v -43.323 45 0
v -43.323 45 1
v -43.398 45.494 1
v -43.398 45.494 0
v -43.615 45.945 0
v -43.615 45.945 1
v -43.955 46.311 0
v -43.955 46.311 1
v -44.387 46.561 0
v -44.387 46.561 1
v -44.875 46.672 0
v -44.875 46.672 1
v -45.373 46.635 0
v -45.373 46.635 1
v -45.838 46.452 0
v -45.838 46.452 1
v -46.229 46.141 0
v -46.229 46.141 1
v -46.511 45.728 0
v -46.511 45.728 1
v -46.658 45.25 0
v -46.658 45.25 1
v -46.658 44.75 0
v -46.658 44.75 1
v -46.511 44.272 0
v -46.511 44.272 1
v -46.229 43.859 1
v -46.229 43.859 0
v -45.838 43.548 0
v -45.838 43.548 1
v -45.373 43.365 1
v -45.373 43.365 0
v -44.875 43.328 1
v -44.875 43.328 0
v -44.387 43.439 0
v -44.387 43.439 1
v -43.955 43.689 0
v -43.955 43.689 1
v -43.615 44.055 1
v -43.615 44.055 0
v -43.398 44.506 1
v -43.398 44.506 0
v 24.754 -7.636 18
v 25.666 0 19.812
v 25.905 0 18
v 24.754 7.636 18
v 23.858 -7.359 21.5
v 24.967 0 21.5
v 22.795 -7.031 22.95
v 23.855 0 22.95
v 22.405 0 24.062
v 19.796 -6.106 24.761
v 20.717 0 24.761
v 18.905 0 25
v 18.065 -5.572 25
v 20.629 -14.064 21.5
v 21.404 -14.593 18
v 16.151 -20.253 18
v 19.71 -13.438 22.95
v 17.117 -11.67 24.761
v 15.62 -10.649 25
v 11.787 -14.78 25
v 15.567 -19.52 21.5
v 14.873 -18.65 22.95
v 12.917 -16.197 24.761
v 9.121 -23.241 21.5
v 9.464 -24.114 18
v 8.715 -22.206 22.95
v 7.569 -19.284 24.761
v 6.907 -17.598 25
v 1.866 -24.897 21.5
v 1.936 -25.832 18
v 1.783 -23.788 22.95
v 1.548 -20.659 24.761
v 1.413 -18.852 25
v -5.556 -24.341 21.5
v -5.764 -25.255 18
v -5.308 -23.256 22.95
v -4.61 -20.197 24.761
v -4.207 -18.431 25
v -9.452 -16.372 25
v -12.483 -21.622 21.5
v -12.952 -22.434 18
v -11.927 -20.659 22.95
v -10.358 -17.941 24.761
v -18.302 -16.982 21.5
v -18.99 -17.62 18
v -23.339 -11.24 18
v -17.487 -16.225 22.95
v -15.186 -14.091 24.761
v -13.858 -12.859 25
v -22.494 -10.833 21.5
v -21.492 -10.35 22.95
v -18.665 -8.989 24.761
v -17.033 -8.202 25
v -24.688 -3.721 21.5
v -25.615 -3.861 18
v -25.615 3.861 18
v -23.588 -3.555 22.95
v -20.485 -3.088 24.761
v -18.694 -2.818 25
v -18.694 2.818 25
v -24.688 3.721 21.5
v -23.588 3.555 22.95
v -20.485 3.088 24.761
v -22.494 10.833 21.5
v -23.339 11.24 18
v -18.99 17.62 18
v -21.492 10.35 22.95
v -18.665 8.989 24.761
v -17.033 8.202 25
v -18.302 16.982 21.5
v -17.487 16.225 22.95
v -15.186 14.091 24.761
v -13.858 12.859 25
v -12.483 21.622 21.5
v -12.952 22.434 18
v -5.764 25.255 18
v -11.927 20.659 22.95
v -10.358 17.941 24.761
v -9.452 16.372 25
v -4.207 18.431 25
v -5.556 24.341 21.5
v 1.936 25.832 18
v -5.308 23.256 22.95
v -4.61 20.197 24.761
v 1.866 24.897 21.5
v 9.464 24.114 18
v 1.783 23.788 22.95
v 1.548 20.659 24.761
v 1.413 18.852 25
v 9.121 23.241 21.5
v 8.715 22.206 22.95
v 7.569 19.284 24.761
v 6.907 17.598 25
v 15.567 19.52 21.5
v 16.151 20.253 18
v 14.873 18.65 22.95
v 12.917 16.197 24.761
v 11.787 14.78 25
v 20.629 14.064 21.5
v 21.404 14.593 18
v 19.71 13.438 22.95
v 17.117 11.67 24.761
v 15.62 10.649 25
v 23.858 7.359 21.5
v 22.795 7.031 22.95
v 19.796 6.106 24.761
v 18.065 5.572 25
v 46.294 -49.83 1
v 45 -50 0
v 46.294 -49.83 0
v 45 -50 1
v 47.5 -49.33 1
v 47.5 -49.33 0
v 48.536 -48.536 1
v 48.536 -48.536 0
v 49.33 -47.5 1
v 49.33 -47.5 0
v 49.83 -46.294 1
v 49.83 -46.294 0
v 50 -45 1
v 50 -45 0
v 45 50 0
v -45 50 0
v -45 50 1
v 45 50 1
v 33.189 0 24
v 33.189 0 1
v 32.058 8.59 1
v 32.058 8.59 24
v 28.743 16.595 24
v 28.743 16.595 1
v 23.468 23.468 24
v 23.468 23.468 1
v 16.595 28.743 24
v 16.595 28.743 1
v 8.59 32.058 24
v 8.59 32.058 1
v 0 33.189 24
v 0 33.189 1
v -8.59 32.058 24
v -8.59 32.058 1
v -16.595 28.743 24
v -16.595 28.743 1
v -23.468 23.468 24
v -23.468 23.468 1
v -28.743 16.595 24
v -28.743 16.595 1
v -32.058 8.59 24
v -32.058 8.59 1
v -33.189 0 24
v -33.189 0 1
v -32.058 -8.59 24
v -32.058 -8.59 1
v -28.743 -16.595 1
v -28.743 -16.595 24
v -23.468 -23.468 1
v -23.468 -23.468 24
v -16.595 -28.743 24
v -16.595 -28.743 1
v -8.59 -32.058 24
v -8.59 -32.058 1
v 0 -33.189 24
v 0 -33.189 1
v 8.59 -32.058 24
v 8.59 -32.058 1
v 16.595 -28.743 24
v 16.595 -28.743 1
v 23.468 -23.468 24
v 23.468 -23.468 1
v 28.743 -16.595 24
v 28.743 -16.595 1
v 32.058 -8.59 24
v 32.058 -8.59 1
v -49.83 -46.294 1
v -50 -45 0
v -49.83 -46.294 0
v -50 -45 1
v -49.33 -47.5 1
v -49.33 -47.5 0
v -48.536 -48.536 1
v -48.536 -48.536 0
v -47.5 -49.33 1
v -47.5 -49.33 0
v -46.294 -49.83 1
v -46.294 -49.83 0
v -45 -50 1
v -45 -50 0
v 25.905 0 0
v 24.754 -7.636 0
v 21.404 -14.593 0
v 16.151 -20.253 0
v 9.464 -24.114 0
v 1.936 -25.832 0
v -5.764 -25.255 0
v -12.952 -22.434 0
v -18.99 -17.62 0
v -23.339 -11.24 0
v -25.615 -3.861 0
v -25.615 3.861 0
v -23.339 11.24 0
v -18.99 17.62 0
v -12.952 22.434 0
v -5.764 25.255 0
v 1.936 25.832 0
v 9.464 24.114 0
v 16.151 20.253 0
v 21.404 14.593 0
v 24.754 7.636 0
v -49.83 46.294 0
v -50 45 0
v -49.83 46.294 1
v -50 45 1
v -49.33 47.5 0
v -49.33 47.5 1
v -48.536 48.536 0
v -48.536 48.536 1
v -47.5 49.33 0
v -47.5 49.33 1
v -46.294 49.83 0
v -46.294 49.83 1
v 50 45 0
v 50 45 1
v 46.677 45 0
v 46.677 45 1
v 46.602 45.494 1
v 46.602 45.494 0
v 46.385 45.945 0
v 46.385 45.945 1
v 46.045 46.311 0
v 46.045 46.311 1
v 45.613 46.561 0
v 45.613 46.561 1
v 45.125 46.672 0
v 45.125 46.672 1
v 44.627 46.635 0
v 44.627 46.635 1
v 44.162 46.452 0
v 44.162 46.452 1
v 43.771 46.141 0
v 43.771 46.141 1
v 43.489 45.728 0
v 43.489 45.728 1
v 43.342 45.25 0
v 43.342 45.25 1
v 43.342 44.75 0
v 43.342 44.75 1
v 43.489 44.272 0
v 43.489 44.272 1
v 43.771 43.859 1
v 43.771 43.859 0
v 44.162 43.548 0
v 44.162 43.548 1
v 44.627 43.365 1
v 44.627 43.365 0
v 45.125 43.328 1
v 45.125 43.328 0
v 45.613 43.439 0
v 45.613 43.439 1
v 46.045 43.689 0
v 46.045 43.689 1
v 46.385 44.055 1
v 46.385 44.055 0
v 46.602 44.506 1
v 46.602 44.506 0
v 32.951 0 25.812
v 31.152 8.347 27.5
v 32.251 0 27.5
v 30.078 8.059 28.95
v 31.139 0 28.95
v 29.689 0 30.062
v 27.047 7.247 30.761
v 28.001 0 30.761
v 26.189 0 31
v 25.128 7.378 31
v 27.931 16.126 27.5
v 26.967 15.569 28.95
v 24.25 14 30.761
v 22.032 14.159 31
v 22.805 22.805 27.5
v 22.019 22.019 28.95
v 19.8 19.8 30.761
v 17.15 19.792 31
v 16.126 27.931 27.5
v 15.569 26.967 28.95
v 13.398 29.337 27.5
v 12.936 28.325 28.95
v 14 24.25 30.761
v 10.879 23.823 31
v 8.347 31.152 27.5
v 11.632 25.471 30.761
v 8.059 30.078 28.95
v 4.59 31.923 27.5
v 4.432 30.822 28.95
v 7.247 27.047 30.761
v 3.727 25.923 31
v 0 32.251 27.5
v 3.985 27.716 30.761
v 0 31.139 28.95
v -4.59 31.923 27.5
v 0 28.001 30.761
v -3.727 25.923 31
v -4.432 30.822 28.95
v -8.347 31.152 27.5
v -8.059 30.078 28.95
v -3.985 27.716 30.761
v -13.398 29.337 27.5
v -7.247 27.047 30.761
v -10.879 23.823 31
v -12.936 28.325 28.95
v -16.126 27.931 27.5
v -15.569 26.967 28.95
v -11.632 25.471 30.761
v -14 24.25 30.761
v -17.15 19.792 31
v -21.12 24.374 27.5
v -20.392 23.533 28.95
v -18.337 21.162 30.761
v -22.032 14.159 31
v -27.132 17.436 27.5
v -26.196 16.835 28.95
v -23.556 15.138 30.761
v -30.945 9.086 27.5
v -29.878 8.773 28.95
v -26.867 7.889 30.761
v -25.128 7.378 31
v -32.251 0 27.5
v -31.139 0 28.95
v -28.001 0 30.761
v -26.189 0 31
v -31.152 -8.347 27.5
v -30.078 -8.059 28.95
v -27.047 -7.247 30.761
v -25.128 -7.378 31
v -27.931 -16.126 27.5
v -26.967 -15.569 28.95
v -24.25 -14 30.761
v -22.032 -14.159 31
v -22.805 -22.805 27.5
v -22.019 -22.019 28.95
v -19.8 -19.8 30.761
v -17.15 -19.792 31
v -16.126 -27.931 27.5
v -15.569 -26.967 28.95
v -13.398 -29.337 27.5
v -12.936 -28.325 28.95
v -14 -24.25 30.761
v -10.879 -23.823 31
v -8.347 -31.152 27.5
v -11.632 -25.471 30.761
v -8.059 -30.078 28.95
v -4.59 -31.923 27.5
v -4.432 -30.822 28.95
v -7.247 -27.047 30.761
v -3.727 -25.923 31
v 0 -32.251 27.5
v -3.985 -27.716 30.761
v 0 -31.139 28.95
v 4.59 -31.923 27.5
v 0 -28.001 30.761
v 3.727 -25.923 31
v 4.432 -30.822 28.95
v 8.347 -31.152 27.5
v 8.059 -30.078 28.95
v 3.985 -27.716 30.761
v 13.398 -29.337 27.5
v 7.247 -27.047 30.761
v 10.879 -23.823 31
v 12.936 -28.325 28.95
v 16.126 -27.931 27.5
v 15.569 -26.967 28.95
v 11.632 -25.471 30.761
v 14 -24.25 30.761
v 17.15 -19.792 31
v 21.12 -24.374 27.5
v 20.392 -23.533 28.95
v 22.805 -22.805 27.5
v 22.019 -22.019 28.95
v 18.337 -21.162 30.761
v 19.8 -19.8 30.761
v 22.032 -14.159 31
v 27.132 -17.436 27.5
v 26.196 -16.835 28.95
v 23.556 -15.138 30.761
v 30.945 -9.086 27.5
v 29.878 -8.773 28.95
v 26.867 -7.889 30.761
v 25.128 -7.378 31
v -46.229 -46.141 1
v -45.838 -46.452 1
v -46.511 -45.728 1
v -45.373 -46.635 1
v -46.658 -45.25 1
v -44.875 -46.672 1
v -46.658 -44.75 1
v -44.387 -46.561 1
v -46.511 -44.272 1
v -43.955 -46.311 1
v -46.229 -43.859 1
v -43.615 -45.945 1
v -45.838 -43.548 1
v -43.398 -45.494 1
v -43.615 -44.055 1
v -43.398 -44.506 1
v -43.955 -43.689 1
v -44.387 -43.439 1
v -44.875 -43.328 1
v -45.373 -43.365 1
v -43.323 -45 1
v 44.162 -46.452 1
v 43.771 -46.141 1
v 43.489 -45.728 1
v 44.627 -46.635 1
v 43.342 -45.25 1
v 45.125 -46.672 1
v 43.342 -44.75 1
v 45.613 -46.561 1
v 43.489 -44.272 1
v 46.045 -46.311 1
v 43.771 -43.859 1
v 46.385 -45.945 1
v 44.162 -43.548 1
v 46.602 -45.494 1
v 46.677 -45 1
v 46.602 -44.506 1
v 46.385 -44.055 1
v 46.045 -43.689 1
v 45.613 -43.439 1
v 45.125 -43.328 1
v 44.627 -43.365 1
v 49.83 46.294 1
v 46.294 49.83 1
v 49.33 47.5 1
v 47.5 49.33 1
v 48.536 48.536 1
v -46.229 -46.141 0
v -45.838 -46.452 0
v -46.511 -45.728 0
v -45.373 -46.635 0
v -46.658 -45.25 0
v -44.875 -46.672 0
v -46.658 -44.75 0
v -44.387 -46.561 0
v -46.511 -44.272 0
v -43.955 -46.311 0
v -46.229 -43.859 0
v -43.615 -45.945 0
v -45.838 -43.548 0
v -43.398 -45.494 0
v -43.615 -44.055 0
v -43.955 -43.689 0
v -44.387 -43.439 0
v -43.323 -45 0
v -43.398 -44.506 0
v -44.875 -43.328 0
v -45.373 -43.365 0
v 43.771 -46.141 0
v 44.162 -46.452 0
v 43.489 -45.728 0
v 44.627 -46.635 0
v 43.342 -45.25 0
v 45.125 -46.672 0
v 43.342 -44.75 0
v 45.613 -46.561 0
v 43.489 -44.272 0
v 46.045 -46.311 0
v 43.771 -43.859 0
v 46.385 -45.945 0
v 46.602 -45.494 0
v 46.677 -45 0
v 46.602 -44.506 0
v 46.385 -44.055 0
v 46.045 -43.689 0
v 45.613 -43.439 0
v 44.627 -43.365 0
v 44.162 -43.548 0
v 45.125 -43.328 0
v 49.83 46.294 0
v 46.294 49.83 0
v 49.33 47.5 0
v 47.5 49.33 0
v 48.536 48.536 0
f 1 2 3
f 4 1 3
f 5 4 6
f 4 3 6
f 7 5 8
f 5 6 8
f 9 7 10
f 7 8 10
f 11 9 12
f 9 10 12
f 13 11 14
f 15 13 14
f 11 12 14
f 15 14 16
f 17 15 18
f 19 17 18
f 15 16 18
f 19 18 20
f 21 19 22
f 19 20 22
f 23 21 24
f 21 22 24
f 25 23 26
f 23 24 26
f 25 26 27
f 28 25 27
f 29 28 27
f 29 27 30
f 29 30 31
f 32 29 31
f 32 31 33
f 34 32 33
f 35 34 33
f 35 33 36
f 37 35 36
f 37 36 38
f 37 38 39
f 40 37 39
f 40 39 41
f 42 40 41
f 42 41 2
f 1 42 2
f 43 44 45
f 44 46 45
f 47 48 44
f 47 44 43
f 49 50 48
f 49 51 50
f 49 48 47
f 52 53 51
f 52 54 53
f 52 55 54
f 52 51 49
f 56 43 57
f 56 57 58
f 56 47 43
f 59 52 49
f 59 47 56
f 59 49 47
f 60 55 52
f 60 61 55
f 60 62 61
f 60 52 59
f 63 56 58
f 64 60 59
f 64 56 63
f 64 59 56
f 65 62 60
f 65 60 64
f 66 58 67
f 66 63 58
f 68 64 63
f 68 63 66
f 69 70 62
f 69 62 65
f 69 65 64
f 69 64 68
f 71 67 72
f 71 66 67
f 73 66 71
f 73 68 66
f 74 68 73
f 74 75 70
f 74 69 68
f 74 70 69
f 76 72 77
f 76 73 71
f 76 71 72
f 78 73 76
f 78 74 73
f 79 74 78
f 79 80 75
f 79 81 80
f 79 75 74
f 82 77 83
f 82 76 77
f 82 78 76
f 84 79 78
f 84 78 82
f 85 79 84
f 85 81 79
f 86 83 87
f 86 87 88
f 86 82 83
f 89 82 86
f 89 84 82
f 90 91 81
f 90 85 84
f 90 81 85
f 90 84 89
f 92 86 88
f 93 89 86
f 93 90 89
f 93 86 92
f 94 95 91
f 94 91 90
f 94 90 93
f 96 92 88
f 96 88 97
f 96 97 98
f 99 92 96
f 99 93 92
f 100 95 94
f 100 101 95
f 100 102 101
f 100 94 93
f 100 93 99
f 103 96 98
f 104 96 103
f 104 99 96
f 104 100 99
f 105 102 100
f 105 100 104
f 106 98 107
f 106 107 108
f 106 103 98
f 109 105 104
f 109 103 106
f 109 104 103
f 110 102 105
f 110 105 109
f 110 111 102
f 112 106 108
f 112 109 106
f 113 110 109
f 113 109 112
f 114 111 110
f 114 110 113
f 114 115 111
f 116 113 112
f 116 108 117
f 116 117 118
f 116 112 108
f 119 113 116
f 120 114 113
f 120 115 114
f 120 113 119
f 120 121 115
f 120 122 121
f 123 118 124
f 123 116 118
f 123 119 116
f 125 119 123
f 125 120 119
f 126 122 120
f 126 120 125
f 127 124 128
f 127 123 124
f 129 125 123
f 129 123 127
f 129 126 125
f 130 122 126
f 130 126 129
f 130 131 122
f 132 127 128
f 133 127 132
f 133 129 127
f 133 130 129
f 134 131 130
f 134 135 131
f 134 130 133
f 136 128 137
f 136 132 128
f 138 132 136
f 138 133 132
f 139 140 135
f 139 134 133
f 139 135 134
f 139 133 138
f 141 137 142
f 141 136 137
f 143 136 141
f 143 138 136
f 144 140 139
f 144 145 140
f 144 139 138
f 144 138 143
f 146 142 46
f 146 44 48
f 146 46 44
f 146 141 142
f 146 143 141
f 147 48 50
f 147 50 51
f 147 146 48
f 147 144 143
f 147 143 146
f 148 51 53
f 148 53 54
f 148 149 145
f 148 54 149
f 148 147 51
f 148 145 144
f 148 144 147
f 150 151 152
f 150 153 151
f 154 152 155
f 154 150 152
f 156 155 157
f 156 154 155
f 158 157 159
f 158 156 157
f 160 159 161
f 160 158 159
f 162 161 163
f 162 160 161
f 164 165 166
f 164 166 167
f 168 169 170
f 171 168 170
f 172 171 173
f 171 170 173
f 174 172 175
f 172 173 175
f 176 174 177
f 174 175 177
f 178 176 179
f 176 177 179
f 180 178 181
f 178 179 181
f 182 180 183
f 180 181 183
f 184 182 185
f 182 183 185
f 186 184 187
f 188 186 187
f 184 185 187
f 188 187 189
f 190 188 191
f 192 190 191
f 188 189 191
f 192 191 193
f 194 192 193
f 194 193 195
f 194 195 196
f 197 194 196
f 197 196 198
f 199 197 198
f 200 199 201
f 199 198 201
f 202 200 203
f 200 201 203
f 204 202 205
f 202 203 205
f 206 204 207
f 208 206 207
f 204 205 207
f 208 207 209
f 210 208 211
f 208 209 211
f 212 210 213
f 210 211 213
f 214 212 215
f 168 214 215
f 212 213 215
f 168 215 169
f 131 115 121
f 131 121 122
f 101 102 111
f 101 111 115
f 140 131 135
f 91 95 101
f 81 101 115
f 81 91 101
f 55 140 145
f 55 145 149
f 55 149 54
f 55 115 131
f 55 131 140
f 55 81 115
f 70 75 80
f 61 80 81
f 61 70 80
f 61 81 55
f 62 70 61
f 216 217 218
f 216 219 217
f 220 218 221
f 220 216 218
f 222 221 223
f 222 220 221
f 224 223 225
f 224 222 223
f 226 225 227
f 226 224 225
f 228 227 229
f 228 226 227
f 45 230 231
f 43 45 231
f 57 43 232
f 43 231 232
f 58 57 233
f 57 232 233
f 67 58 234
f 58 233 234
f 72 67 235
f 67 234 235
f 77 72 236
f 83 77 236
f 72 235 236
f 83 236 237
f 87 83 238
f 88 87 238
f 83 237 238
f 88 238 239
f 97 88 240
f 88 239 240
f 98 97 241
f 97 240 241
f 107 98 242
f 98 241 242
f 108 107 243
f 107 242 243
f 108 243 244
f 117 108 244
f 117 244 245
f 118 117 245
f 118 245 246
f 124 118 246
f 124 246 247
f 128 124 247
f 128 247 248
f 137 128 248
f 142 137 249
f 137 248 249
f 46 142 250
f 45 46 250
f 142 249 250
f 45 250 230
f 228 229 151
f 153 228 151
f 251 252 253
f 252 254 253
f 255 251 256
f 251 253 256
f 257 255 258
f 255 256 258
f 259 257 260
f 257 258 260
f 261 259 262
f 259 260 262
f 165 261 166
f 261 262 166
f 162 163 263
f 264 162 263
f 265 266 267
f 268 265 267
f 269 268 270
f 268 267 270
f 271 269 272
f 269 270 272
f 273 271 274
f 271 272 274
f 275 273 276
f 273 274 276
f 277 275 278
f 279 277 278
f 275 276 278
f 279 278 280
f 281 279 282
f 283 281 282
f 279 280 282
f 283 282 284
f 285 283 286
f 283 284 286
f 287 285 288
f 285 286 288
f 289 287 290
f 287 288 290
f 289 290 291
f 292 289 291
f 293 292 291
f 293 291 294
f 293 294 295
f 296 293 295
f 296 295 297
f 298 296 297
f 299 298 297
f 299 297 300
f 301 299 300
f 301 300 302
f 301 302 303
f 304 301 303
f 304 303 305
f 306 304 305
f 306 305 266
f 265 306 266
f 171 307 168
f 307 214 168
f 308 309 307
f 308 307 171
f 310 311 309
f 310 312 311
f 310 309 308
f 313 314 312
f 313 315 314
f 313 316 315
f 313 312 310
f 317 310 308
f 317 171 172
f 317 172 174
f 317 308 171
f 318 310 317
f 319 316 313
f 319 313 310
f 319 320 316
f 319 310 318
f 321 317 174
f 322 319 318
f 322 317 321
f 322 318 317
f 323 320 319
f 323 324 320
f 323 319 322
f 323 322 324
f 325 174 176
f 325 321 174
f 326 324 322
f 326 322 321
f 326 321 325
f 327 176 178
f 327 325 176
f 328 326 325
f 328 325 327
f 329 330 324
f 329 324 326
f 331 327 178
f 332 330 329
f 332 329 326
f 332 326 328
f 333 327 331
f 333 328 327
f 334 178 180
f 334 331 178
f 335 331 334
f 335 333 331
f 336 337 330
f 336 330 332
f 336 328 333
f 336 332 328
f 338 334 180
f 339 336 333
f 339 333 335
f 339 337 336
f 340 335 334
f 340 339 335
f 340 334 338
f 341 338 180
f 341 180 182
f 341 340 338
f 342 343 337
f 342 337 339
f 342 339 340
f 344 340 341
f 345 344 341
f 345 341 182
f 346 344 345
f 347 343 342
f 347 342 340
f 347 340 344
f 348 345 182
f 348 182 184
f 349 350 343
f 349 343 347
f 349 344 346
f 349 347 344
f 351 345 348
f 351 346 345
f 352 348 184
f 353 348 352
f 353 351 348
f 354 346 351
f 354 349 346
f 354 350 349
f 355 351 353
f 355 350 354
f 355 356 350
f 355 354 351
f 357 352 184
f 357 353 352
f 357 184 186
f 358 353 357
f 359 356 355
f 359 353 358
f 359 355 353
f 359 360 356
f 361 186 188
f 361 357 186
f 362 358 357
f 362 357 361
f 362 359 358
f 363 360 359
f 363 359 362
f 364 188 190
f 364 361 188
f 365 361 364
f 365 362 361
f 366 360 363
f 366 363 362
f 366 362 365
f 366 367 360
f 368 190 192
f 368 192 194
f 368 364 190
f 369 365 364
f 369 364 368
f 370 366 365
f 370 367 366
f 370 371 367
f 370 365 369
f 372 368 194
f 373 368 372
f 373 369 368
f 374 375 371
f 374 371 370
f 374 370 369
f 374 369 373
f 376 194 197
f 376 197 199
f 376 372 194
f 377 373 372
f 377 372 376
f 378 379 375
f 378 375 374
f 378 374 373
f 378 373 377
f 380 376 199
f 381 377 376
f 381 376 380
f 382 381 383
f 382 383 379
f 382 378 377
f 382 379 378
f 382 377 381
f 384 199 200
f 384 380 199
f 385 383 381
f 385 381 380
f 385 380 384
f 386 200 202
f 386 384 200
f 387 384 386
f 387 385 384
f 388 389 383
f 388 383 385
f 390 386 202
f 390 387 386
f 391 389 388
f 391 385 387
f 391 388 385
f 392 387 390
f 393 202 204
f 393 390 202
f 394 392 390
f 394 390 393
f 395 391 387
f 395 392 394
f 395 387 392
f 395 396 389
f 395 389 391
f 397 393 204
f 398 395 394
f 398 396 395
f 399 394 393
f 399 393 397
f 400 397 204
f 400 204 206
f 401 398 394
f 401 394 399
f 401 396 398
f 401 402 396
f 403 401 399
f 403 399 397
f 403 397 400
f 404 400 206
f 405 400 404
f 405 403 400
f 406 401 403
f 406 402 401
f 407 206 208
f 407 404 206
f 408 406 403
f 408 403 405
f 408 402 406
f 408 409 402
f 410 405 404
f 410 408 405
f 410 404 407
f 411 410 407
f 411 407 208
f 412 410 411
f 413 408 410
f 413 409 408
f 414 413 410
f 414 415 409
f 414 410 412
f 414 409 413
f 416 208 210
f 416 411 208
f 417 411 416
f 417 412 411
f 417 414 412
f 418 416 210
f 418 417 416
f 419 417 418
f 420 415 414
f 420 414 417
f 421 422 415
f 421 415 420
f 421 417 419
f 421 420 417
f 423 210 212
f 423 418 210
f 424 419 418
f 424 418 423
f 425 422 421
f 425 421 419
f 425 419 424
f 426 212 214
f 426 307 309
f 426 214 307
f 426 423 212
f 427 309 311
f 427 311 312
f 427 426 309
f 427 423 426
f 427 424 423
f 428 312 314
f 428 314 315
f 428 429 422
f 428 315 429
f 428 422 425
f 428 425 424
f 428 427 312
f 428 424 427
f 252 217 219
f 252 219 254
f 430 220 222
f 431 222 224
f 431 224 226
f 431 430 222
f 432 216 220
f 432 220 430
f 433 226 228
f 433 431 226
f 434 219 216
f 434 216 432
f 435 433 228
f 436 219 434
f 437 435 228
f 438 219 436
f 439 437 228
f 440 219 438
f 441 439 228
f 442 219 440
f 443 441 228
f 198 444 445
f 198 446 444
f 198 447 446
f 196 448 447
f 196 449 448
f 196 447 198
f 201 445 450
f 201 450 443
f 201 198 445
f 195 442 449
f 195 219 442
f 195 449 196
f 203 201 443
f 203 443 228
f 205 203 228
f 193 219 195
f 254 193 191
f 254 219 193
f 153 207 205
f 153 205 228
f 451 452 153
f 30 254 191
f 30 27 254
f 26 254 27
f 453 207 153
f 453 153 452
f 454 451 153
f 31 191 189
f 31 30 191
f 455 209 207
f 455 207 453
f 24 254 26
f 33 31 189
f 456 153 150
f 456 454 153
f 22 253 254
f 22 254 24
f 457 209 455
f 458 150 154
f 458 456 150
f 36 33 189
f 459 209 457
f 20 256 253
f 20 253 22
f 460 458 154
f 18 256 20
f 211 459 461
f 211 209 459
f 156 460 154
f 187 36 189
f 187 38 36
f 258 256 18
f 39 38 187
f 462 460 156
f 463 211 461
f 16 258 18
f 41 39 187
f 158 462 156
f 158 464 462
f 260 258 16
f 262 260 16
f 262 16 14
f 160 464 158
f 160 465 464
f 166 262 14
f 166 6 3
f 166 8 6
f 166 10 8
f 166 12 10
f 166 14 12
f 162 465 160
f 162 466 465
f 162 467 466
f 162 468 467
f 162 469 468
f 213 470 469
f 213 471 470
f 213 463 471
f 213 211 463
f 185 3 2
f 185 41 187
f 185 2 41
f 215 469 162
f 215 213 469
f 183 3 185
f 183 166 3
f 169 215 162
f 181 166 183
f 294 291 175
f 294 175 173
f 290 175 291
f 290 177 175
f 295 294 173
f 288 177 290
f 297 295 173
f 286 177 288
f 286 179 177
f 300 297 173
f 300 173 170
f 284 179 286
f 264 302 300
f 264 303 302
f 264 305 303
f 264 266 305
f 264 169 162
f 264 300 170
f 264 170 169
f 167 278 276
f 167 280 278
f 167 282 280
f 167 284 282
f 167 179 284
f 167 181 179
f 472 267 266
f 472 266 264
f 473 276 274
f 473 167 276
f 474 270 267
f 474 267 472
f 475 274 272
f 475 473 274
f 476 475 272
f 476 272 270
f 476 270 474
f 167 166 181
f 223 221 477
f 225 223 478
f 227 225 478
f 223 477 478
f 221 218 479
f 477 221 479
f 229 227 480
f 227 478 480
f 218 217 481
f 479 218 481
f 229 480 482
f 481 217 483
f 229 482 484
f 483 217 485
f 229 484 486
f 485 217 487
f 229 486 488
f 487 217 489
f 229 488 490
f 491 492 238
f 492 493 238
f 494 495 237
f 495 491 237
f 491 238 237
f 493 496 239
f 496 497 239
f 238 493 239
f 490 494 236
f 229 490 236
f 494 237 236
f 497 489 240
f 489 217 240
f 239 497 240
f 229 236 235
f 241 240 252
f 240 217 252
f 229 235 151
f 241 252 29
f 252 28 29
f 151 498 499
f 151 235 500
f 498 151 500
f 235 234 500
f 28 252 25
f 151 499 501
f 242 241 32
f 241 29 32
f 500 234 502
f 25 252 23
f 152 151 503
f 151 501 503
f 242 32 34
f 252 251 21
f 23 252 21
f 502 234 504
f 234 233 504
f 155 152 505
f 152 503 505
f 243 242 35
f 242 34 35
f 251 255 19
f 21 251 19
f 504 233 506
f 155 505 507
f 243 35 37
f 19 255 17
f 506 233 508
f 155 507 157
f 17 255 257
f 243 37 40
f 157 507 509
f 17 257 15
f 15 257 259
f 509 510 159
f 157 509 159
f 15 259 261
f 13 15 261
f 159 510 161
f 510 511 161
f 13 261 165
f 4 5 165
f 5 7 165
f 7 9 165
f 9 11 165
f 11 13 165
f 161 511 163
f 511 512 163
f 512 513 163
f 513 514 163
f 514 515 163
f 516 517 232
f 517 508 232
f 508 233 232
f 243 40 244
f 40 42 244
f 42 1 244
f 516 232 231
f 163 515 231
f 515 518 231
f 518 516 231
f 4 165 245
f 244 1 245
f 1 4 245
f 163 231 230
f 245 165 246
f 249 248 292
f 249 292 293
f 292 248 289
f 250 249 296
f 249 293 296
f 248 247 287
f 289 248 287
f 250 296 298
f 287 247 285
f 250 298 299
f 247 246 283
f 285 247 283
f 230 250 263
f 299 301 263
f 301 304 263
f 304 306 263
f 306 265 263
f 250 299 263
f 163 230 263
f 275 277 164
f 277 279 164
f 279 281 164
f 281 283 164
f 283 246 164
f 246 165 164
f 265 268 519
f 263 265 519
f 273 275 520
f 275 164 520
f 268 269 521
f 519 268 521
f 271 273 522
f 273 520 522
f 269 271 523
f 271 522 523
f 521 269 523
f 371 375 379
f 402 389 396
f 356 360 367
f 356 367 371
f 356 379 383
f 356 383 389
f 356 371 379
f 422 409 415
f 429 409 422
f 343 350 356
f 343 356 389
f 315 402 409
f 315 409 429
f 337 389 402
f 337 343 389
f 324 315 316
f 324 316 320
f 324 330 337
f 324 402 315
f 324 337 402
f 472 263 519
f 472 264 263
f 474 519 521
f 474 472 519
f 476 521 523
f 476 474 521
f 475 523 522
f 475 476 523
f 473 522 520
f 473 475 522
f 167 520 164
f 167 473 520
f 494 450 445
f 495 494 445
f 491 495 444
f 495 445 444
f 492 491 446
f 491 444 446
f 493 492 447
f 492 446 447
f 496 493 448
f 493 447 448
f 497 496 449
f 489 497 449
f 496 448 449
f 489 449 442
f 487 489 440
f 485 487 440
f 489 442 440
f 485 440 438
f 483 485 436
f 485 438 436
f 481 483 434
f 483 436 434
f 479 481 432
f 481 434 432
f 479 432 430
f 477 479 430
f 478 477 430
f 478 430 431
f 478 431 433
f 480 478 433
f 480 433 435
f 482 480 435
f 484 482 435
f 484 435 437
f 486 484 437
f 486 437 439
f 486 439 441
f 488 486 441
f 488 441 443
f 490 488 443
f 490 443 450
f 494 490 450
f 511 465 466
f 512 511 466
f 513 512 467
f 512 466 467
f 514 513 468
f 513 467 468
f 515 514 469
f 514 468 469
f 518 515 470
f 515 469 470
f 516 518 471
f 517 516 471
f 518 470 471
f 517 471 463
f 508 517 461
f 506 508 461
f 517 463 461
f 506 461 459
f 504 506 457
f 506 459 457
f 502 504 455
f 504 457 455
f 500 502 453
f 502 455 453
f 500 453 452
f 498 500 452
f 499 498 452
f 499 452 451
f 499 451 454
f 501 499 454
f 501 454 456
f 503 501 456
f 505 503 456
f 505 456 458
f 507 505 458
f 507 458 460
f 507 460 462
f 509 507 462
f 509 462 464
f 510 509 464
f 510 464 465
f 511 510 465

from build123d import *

# Parameters (mm, degrees)
F0_W     = 100
F0_H     = 100
F1_DEPTH = 1
F2_R     = 5
F3_R     = 1.676803
F4_DEPTH = 25
F5_R     = 33.189229
F6_DEPTH = 30
F7_R     = 25.904807
F8_DEPTH = 25
F9_R     = 7


with BuildPart() as f1:
    # F0 (on Top) → F1 (new body)
    with BuildSketch(Plane.XY):
        Rectangle(F0_W, F0_H)
    extrude(amount=F1_DEPTH)

    # F2
    f2_edges = [f1.edges().sort_by_distance(p)[0] for p in [
        (50, -50, 0.5),
        (-50, -50, 0.5),
        (-50, 50, 0.5),
        (50, 50, 0.5),
    ]]
    fillet(f2_edges, radius=F2_R)

    # F3 (on face) → F4 (cut)
    with BuildSketch(Plane.XY.offset(1)):
        with Locations((45, 45)):
            Circle(F3_R)
        with Locations((-45, 45)):
            Circle(F3_R)
        with Locations((-45, -45)):
            Circle(F3_R)
        with Locations((45, -45)):
            Circle(F3_R)
    extrude(amount=-F4_DEPTH, mode=Mode.SUBTRACT)

    # F5 (on face) → F6 (join)
    with BuildSketch(Plane.XY.offset(1)):
        Circle(F5_R)
    extrude(amount=F6_DEPTH)

    # F7 (on face) → F8 (cut)
    with BuildSketch(Plane(origin=(0, 0, 0), x_dir=(1, 0, 0), z_dir=(0, 0, -1))):
        Circle(F7_R)
    extrude(amount=-F8_DEPTH, mode=Mode.SUBTRACT)

    # F9
    f9_edges = [f1.edges().sort_by_distance(p)[0] for p in [
        (-33.189229, 0, 31),
        (-25.904807, 0, 25),
    ]]
    fillet(f9_edges, radius=F9_R)


solid = f1.part
